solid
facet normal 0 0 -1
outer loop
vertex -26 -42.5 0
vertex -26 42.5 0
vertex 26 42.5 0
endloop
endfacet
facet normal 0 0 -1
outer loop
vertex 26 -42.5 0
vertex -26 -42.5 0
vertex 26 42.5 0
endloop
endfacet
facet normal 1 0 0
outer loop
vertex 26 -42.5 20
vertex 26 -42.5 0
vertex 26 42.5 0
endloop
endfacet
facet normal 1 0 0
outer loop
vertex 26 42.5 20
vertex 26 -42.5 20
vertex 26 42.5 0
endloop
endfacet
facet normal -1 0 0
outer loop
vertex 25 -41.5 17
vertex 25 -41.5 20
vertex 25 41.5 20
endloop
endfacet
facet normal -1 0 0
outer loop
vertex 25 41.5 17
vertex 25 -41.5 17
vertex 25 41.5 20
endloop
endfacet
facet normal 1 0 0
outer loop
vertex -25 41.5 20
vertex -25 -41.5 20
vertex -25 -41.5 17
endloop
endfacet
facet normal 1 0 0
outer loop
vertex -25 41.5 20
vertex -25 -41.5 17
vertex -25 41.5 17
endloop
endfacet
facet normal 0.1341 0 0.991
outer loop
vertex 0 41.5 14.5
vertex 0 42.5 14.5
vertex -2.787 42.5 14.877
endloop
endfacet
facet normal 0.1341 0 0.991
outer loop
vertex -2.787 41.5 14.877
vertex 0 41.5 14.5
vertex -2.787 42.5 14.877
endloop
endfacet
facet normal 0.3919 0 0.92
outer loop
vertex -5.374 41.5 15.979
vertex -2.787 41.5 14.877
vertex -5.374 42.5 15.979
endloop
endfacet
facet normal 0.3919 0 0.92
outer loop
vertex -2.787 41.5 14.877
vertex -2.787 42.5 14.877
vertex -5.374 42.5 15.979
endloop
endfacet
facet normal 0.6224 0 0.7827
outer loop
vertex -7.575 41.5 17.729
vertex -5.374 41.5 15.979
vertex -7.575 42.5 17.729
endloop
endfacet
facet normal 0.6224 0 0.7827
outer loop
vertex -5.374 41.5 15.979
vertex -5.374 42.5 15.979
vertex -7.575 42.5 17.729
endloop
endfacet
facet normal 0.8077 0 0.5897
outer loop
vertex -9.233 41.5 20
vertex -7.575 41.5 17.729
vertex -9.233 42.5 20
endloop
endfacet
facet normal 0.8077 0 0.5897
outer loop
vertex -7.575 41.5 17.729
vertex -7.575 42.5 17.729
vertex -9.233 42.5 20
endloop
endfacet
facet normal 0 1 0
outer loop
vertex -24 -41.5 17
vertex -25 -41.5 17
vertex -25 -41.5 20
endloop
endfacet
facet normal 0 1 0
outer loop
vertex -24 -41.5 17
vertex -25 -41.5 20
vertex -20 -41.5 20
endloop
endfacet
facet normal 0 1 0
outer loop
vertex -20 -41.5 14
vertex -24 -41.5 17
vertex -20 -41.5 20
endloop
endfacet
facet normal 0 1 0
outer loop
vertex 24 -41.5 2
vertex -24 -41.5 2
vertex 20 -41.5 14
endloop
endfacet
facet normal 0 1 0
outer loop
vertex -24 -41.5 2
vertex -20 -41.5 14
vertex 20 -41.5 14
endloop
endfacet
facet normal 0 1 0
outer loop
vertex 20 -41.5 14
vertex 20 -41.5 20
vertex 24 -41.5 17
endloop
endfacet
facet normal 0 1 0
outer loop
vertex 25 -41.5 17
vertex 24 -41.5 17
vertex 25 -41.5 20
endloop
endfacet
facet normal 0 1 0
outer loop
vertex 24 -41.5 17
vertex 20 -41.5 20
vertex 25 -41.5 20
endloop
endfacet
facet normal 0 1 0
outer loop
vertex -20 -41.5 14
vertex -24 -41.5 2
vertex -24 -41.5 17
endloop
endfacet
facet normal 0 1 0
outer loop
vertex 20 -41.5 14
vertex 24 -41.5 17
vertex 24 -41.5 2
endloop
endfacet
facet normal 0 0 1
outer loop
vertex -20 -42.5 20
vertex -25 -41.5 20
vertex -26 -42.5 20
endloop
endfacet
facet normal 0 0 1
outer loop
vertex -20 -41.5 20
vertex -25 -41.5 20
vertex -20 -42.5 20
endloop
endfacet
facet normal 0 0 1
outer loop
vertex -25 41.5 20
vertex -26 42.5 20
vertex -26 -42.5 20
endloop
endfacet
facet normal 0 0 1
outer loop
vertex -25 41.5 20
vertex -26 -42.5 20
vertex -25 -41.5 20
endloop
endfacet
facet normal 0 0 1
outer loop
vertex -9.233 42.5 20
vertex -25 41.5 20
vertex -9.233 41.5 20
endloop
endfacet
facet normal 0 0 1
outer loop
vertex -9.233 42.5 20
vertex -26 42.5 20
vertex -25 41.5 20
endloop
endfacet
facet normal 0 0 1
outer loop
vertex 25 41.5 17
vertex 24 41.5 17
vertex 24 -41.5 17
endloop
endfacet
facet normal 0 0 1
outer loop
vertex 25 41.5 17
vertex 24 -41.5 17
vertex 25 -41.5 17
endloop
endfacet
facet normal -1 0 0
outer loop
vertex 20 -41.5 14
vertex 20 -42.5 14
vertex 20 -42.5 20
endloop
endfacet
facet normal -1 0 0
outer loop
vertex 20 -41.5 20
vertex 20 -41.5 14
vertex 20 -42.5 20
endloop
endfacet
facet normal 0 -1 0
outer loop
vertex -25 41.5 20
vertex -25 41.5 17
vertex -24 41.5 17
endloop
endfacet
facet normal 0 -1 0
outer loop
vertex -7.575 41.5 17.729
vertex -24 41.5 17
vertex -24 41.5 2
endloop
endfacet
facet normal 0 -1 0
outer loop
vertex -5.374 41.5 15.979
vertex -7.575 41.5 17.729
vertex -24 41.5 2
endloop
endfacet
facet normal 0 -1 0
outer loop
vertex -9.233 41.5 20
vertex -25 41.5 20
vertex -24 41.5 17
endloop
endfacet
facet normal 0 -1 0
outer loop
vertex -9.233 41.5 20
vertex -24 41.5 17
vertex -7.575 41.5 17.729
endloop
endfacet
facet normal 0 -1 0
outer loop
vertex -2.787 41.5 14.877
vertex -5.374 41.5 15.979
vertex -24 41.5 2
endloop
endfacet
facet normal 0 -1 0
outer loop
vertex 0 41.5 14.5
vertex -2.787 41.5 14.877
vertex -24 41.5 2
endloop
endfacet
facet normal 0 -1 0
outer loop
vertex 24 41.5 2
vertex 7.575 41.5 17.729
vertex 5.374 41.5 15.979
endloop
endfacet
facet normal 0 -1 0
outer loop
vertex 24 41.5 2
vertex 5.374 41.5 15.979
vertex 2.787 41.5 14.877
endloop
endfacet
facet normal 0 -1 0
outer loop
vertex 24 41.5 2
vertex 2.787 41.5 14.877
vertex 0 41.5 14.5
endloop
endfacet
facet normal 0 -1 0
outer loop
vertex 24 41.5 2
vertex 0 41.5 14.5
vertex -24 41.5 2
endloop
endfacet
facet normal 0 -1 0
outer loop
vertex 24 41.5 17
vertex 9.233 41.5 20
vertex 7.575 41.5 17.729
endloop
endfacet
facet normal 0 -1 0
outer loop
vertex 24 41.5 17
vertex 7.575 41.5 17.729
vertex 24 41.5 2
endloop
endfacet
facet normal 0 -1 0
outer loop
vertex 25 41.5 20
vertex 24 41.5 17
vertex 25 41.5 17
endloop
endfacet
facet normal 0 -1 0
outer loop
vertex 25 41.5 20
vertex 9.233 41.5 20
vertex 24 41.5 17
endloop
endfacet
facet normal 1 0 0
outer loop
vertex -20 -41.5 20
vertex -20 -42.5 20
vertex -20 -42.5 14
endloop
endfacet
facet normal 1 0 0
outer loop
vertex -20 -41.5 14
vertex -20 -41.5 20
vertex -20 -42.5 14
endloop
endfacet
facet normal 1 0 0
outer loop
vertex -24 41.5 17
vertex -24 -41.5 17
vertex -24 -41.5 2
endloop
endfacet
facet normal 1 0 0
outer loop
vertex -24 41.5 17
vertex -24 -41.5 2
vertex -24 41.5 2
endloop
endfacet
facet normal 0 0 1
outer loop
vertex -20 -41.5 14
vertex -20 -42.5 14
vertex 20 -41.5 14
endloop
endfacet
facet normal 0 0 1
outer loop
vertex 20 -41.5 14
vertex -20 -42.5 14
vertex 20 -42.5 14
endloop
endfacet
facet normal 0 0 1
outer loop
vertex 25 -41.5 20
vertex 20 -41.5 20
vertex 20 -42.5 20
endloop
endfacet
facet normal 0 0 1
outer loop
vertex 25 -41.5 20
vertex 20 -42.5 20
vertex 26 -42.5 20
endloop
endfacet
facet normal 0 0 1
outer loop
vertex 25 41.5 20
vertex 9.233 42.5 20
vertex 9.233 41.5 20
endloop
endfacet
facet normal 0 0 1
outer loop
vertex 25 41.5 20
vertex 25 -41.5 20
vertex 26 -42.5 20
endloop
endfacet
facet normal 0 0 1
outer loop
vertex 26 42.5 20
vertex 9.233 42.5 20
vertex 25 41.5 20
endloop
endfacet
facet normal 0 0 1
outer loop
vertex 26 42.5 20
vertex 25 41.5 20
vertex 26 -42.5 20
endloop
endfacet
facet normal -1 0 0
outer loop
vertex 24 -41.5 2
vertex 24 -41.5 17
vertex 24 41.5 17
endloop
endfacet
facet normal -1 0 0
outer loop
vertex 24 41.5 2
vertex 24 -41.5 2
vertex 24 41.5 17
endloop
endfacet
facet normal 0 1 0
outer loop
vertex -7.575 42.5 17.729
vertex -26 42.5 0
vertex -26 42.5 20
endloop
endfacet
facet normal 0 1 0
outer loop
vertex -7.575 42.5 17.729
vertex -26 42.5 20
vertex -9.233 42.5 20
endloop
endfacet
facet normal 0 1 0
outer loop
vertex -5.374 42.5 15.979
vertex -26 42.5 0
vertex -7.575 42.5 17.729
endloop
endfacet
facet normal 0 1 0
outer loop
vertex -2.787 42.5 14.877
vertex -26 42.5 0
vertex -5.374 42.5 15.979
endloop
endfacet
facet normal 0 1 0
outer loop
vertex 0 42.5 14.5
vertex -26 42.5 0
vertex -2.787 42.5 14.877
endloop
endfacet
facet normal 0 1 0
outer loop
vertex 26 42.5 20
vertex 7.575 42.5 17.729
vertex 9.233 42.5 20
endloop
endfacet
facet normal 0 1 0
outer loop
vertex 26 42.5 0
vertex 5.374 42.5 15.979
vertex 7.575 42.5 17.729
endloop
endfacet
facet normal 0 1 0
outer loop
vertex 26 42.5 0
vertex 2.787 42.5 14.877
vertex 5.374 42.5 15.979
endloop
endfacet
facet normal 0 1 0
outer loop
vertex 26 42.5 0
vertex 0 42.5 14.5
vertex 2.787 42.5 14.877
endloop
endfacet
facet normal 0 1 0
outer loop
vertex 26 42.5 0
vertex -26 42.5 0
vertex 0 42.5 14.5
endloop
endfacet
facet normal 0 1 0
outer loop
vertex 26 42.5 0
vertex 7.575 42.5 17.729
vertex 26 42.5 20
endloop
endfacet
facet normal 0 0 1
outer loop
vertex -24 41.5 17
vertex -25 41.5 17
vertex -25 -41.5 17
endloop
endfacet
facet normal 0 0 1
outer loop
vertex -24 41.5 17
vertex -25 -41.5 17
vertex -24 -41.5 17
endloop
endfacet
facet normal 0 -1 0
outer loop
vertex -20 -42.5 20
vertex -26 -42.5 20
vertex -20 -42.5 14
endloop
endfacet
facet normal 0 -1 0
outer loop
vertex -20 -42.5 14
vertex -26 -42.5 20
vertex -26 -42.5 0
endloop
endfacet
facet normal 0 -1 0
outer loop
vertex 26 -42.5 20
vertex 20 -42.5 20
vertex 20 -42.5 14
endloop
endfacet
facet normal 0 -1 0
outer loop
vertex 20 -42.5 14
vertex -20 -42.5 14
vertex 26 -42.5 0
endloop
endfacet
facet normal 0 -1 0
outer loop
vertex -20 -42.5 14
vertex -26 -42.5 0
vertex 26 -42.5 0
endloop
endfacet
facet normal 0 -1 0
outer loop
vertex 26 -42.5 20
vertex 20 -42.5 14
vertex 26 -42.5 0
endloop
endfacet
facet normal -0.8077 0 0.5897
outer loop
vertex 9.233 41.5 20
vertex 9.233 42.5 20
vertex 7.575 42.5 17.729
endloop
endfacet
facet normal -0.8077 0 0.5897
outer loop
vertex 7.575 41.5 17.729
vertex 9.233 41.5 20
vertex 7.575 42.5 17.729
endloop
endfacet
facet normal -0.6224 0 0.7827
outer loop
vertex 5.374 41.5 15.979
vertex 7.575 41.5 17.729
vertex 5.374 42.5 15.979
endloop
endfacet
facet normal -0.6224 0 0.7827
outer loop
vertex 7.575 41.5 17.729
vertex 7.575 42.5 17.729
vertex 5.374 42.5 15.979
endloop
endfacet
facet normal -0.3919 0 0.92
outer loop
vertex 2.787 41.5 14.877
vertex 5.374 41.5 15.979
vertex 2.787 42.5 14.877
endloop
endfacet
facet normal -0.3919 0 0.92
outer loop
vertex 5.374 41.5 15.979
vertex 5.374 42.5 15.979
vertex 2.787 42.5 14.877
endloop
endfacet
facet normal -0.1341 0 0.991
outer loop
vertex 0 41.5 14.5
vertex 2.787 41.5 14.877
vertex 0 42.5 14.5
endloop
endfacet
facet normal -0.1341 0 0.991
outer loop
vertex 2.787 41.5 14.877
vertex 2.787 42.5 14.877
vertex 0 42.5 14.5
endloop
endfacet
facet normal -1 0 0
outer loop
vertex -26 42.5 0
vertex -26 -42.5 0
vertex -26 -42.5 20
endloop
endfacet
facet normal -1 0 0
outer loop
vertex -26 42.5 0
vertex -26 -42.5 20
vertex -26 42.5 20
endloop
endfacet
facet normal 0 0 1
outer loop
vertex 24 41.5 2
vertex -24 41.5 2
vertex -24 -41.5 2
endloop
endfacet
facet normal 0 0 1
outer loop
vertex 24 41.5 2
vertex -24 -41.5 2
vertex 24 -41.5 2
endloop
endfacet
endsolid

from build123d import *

# Parameters (mm, degrees)
F0_W      = 52
F0_H      = 85
F1_DEPTH  = 20
F2_W      = 48
F2_H      = 83
F3_DEPTH  = 18
F5_DEPTH  = 5
F7_DEPTH  = 5
F8_W      = 1
F8_H      = 83
F9_DEPTH  = 3
F10_W     = 1
F10_H     = 83
F11_DEPTH = 3


with BuildPart() as f1:
    # F0 (on Top) → F1 (new body)
    with BuildSketch(Plane.XY):
        Rectangle(F0_W, F0_H)
    extrude(amount=F1_DEPTH)

    # F2 (on face) → F3 (cut)
    with BuildSketch(Plane.XY.offset(20)):
        Rectangle(F2_W, F2_H)
    extrude(amount=-F3_DEPTH, mode=Mode.SUBTRACT)

    # F4 (on face) → F5 (cut)
    with BuildSketch(Plane.XZ.offset(42.5)):
        Polygon((-20, 14), (0, 14), (20, 14), (20, 20), (-20, 20), align=None)
    extrude(amount=-F5_DEPTH, mode=Mode.SUBTRACT)

    # F6 (on face) → F7 (cut)
    with BuildSketch(Plane(origin=(0, 42.5, 0), x_dir=(-1, 0, 0), z_dir=(0, 1, 0))):
        with BuildLine():
            ThreePointArc((-9.2330926563, 20), (-5.3735463151, 15.9791907237), (0, 14.5))
            Line((0, 14.5), (0, 20))
            Line((0, 20), (-9.2330926563, 20))
        make_face()
        with BuildLine():
            Line((0, 20), (0, 14.5))
            ThreePointArc((0, 14.5), (5.3735463151, 15.9791907237), (9.2330926563, 20))
            Line((9.2330926563, 20), (0, 20))
        make_face()
    extrude(amount=-F7_DEPTH, mode=Mode.SUBTRACT)

    # F8 (on face) → F9 (cut)
    with BuildSketch(Plane.XY.offset(20)):
        with Locations((24.5, 0)):
            Rectangle(F8_W, F8_H)
    extrude(amount=-F9_DEPTH, mode=Mode.SUBTRACT)

    # F10 (on face) → F11 (cut)
    with BuildSketch(Plane.XY.offset(20)):
        with Locations((-24.5, 0)):
            Rectangle(F10_W, F10_H)
    extrude(amount=-F11_DEPTH, mode=Mode.SUBTRACT)


solid = f1.part
